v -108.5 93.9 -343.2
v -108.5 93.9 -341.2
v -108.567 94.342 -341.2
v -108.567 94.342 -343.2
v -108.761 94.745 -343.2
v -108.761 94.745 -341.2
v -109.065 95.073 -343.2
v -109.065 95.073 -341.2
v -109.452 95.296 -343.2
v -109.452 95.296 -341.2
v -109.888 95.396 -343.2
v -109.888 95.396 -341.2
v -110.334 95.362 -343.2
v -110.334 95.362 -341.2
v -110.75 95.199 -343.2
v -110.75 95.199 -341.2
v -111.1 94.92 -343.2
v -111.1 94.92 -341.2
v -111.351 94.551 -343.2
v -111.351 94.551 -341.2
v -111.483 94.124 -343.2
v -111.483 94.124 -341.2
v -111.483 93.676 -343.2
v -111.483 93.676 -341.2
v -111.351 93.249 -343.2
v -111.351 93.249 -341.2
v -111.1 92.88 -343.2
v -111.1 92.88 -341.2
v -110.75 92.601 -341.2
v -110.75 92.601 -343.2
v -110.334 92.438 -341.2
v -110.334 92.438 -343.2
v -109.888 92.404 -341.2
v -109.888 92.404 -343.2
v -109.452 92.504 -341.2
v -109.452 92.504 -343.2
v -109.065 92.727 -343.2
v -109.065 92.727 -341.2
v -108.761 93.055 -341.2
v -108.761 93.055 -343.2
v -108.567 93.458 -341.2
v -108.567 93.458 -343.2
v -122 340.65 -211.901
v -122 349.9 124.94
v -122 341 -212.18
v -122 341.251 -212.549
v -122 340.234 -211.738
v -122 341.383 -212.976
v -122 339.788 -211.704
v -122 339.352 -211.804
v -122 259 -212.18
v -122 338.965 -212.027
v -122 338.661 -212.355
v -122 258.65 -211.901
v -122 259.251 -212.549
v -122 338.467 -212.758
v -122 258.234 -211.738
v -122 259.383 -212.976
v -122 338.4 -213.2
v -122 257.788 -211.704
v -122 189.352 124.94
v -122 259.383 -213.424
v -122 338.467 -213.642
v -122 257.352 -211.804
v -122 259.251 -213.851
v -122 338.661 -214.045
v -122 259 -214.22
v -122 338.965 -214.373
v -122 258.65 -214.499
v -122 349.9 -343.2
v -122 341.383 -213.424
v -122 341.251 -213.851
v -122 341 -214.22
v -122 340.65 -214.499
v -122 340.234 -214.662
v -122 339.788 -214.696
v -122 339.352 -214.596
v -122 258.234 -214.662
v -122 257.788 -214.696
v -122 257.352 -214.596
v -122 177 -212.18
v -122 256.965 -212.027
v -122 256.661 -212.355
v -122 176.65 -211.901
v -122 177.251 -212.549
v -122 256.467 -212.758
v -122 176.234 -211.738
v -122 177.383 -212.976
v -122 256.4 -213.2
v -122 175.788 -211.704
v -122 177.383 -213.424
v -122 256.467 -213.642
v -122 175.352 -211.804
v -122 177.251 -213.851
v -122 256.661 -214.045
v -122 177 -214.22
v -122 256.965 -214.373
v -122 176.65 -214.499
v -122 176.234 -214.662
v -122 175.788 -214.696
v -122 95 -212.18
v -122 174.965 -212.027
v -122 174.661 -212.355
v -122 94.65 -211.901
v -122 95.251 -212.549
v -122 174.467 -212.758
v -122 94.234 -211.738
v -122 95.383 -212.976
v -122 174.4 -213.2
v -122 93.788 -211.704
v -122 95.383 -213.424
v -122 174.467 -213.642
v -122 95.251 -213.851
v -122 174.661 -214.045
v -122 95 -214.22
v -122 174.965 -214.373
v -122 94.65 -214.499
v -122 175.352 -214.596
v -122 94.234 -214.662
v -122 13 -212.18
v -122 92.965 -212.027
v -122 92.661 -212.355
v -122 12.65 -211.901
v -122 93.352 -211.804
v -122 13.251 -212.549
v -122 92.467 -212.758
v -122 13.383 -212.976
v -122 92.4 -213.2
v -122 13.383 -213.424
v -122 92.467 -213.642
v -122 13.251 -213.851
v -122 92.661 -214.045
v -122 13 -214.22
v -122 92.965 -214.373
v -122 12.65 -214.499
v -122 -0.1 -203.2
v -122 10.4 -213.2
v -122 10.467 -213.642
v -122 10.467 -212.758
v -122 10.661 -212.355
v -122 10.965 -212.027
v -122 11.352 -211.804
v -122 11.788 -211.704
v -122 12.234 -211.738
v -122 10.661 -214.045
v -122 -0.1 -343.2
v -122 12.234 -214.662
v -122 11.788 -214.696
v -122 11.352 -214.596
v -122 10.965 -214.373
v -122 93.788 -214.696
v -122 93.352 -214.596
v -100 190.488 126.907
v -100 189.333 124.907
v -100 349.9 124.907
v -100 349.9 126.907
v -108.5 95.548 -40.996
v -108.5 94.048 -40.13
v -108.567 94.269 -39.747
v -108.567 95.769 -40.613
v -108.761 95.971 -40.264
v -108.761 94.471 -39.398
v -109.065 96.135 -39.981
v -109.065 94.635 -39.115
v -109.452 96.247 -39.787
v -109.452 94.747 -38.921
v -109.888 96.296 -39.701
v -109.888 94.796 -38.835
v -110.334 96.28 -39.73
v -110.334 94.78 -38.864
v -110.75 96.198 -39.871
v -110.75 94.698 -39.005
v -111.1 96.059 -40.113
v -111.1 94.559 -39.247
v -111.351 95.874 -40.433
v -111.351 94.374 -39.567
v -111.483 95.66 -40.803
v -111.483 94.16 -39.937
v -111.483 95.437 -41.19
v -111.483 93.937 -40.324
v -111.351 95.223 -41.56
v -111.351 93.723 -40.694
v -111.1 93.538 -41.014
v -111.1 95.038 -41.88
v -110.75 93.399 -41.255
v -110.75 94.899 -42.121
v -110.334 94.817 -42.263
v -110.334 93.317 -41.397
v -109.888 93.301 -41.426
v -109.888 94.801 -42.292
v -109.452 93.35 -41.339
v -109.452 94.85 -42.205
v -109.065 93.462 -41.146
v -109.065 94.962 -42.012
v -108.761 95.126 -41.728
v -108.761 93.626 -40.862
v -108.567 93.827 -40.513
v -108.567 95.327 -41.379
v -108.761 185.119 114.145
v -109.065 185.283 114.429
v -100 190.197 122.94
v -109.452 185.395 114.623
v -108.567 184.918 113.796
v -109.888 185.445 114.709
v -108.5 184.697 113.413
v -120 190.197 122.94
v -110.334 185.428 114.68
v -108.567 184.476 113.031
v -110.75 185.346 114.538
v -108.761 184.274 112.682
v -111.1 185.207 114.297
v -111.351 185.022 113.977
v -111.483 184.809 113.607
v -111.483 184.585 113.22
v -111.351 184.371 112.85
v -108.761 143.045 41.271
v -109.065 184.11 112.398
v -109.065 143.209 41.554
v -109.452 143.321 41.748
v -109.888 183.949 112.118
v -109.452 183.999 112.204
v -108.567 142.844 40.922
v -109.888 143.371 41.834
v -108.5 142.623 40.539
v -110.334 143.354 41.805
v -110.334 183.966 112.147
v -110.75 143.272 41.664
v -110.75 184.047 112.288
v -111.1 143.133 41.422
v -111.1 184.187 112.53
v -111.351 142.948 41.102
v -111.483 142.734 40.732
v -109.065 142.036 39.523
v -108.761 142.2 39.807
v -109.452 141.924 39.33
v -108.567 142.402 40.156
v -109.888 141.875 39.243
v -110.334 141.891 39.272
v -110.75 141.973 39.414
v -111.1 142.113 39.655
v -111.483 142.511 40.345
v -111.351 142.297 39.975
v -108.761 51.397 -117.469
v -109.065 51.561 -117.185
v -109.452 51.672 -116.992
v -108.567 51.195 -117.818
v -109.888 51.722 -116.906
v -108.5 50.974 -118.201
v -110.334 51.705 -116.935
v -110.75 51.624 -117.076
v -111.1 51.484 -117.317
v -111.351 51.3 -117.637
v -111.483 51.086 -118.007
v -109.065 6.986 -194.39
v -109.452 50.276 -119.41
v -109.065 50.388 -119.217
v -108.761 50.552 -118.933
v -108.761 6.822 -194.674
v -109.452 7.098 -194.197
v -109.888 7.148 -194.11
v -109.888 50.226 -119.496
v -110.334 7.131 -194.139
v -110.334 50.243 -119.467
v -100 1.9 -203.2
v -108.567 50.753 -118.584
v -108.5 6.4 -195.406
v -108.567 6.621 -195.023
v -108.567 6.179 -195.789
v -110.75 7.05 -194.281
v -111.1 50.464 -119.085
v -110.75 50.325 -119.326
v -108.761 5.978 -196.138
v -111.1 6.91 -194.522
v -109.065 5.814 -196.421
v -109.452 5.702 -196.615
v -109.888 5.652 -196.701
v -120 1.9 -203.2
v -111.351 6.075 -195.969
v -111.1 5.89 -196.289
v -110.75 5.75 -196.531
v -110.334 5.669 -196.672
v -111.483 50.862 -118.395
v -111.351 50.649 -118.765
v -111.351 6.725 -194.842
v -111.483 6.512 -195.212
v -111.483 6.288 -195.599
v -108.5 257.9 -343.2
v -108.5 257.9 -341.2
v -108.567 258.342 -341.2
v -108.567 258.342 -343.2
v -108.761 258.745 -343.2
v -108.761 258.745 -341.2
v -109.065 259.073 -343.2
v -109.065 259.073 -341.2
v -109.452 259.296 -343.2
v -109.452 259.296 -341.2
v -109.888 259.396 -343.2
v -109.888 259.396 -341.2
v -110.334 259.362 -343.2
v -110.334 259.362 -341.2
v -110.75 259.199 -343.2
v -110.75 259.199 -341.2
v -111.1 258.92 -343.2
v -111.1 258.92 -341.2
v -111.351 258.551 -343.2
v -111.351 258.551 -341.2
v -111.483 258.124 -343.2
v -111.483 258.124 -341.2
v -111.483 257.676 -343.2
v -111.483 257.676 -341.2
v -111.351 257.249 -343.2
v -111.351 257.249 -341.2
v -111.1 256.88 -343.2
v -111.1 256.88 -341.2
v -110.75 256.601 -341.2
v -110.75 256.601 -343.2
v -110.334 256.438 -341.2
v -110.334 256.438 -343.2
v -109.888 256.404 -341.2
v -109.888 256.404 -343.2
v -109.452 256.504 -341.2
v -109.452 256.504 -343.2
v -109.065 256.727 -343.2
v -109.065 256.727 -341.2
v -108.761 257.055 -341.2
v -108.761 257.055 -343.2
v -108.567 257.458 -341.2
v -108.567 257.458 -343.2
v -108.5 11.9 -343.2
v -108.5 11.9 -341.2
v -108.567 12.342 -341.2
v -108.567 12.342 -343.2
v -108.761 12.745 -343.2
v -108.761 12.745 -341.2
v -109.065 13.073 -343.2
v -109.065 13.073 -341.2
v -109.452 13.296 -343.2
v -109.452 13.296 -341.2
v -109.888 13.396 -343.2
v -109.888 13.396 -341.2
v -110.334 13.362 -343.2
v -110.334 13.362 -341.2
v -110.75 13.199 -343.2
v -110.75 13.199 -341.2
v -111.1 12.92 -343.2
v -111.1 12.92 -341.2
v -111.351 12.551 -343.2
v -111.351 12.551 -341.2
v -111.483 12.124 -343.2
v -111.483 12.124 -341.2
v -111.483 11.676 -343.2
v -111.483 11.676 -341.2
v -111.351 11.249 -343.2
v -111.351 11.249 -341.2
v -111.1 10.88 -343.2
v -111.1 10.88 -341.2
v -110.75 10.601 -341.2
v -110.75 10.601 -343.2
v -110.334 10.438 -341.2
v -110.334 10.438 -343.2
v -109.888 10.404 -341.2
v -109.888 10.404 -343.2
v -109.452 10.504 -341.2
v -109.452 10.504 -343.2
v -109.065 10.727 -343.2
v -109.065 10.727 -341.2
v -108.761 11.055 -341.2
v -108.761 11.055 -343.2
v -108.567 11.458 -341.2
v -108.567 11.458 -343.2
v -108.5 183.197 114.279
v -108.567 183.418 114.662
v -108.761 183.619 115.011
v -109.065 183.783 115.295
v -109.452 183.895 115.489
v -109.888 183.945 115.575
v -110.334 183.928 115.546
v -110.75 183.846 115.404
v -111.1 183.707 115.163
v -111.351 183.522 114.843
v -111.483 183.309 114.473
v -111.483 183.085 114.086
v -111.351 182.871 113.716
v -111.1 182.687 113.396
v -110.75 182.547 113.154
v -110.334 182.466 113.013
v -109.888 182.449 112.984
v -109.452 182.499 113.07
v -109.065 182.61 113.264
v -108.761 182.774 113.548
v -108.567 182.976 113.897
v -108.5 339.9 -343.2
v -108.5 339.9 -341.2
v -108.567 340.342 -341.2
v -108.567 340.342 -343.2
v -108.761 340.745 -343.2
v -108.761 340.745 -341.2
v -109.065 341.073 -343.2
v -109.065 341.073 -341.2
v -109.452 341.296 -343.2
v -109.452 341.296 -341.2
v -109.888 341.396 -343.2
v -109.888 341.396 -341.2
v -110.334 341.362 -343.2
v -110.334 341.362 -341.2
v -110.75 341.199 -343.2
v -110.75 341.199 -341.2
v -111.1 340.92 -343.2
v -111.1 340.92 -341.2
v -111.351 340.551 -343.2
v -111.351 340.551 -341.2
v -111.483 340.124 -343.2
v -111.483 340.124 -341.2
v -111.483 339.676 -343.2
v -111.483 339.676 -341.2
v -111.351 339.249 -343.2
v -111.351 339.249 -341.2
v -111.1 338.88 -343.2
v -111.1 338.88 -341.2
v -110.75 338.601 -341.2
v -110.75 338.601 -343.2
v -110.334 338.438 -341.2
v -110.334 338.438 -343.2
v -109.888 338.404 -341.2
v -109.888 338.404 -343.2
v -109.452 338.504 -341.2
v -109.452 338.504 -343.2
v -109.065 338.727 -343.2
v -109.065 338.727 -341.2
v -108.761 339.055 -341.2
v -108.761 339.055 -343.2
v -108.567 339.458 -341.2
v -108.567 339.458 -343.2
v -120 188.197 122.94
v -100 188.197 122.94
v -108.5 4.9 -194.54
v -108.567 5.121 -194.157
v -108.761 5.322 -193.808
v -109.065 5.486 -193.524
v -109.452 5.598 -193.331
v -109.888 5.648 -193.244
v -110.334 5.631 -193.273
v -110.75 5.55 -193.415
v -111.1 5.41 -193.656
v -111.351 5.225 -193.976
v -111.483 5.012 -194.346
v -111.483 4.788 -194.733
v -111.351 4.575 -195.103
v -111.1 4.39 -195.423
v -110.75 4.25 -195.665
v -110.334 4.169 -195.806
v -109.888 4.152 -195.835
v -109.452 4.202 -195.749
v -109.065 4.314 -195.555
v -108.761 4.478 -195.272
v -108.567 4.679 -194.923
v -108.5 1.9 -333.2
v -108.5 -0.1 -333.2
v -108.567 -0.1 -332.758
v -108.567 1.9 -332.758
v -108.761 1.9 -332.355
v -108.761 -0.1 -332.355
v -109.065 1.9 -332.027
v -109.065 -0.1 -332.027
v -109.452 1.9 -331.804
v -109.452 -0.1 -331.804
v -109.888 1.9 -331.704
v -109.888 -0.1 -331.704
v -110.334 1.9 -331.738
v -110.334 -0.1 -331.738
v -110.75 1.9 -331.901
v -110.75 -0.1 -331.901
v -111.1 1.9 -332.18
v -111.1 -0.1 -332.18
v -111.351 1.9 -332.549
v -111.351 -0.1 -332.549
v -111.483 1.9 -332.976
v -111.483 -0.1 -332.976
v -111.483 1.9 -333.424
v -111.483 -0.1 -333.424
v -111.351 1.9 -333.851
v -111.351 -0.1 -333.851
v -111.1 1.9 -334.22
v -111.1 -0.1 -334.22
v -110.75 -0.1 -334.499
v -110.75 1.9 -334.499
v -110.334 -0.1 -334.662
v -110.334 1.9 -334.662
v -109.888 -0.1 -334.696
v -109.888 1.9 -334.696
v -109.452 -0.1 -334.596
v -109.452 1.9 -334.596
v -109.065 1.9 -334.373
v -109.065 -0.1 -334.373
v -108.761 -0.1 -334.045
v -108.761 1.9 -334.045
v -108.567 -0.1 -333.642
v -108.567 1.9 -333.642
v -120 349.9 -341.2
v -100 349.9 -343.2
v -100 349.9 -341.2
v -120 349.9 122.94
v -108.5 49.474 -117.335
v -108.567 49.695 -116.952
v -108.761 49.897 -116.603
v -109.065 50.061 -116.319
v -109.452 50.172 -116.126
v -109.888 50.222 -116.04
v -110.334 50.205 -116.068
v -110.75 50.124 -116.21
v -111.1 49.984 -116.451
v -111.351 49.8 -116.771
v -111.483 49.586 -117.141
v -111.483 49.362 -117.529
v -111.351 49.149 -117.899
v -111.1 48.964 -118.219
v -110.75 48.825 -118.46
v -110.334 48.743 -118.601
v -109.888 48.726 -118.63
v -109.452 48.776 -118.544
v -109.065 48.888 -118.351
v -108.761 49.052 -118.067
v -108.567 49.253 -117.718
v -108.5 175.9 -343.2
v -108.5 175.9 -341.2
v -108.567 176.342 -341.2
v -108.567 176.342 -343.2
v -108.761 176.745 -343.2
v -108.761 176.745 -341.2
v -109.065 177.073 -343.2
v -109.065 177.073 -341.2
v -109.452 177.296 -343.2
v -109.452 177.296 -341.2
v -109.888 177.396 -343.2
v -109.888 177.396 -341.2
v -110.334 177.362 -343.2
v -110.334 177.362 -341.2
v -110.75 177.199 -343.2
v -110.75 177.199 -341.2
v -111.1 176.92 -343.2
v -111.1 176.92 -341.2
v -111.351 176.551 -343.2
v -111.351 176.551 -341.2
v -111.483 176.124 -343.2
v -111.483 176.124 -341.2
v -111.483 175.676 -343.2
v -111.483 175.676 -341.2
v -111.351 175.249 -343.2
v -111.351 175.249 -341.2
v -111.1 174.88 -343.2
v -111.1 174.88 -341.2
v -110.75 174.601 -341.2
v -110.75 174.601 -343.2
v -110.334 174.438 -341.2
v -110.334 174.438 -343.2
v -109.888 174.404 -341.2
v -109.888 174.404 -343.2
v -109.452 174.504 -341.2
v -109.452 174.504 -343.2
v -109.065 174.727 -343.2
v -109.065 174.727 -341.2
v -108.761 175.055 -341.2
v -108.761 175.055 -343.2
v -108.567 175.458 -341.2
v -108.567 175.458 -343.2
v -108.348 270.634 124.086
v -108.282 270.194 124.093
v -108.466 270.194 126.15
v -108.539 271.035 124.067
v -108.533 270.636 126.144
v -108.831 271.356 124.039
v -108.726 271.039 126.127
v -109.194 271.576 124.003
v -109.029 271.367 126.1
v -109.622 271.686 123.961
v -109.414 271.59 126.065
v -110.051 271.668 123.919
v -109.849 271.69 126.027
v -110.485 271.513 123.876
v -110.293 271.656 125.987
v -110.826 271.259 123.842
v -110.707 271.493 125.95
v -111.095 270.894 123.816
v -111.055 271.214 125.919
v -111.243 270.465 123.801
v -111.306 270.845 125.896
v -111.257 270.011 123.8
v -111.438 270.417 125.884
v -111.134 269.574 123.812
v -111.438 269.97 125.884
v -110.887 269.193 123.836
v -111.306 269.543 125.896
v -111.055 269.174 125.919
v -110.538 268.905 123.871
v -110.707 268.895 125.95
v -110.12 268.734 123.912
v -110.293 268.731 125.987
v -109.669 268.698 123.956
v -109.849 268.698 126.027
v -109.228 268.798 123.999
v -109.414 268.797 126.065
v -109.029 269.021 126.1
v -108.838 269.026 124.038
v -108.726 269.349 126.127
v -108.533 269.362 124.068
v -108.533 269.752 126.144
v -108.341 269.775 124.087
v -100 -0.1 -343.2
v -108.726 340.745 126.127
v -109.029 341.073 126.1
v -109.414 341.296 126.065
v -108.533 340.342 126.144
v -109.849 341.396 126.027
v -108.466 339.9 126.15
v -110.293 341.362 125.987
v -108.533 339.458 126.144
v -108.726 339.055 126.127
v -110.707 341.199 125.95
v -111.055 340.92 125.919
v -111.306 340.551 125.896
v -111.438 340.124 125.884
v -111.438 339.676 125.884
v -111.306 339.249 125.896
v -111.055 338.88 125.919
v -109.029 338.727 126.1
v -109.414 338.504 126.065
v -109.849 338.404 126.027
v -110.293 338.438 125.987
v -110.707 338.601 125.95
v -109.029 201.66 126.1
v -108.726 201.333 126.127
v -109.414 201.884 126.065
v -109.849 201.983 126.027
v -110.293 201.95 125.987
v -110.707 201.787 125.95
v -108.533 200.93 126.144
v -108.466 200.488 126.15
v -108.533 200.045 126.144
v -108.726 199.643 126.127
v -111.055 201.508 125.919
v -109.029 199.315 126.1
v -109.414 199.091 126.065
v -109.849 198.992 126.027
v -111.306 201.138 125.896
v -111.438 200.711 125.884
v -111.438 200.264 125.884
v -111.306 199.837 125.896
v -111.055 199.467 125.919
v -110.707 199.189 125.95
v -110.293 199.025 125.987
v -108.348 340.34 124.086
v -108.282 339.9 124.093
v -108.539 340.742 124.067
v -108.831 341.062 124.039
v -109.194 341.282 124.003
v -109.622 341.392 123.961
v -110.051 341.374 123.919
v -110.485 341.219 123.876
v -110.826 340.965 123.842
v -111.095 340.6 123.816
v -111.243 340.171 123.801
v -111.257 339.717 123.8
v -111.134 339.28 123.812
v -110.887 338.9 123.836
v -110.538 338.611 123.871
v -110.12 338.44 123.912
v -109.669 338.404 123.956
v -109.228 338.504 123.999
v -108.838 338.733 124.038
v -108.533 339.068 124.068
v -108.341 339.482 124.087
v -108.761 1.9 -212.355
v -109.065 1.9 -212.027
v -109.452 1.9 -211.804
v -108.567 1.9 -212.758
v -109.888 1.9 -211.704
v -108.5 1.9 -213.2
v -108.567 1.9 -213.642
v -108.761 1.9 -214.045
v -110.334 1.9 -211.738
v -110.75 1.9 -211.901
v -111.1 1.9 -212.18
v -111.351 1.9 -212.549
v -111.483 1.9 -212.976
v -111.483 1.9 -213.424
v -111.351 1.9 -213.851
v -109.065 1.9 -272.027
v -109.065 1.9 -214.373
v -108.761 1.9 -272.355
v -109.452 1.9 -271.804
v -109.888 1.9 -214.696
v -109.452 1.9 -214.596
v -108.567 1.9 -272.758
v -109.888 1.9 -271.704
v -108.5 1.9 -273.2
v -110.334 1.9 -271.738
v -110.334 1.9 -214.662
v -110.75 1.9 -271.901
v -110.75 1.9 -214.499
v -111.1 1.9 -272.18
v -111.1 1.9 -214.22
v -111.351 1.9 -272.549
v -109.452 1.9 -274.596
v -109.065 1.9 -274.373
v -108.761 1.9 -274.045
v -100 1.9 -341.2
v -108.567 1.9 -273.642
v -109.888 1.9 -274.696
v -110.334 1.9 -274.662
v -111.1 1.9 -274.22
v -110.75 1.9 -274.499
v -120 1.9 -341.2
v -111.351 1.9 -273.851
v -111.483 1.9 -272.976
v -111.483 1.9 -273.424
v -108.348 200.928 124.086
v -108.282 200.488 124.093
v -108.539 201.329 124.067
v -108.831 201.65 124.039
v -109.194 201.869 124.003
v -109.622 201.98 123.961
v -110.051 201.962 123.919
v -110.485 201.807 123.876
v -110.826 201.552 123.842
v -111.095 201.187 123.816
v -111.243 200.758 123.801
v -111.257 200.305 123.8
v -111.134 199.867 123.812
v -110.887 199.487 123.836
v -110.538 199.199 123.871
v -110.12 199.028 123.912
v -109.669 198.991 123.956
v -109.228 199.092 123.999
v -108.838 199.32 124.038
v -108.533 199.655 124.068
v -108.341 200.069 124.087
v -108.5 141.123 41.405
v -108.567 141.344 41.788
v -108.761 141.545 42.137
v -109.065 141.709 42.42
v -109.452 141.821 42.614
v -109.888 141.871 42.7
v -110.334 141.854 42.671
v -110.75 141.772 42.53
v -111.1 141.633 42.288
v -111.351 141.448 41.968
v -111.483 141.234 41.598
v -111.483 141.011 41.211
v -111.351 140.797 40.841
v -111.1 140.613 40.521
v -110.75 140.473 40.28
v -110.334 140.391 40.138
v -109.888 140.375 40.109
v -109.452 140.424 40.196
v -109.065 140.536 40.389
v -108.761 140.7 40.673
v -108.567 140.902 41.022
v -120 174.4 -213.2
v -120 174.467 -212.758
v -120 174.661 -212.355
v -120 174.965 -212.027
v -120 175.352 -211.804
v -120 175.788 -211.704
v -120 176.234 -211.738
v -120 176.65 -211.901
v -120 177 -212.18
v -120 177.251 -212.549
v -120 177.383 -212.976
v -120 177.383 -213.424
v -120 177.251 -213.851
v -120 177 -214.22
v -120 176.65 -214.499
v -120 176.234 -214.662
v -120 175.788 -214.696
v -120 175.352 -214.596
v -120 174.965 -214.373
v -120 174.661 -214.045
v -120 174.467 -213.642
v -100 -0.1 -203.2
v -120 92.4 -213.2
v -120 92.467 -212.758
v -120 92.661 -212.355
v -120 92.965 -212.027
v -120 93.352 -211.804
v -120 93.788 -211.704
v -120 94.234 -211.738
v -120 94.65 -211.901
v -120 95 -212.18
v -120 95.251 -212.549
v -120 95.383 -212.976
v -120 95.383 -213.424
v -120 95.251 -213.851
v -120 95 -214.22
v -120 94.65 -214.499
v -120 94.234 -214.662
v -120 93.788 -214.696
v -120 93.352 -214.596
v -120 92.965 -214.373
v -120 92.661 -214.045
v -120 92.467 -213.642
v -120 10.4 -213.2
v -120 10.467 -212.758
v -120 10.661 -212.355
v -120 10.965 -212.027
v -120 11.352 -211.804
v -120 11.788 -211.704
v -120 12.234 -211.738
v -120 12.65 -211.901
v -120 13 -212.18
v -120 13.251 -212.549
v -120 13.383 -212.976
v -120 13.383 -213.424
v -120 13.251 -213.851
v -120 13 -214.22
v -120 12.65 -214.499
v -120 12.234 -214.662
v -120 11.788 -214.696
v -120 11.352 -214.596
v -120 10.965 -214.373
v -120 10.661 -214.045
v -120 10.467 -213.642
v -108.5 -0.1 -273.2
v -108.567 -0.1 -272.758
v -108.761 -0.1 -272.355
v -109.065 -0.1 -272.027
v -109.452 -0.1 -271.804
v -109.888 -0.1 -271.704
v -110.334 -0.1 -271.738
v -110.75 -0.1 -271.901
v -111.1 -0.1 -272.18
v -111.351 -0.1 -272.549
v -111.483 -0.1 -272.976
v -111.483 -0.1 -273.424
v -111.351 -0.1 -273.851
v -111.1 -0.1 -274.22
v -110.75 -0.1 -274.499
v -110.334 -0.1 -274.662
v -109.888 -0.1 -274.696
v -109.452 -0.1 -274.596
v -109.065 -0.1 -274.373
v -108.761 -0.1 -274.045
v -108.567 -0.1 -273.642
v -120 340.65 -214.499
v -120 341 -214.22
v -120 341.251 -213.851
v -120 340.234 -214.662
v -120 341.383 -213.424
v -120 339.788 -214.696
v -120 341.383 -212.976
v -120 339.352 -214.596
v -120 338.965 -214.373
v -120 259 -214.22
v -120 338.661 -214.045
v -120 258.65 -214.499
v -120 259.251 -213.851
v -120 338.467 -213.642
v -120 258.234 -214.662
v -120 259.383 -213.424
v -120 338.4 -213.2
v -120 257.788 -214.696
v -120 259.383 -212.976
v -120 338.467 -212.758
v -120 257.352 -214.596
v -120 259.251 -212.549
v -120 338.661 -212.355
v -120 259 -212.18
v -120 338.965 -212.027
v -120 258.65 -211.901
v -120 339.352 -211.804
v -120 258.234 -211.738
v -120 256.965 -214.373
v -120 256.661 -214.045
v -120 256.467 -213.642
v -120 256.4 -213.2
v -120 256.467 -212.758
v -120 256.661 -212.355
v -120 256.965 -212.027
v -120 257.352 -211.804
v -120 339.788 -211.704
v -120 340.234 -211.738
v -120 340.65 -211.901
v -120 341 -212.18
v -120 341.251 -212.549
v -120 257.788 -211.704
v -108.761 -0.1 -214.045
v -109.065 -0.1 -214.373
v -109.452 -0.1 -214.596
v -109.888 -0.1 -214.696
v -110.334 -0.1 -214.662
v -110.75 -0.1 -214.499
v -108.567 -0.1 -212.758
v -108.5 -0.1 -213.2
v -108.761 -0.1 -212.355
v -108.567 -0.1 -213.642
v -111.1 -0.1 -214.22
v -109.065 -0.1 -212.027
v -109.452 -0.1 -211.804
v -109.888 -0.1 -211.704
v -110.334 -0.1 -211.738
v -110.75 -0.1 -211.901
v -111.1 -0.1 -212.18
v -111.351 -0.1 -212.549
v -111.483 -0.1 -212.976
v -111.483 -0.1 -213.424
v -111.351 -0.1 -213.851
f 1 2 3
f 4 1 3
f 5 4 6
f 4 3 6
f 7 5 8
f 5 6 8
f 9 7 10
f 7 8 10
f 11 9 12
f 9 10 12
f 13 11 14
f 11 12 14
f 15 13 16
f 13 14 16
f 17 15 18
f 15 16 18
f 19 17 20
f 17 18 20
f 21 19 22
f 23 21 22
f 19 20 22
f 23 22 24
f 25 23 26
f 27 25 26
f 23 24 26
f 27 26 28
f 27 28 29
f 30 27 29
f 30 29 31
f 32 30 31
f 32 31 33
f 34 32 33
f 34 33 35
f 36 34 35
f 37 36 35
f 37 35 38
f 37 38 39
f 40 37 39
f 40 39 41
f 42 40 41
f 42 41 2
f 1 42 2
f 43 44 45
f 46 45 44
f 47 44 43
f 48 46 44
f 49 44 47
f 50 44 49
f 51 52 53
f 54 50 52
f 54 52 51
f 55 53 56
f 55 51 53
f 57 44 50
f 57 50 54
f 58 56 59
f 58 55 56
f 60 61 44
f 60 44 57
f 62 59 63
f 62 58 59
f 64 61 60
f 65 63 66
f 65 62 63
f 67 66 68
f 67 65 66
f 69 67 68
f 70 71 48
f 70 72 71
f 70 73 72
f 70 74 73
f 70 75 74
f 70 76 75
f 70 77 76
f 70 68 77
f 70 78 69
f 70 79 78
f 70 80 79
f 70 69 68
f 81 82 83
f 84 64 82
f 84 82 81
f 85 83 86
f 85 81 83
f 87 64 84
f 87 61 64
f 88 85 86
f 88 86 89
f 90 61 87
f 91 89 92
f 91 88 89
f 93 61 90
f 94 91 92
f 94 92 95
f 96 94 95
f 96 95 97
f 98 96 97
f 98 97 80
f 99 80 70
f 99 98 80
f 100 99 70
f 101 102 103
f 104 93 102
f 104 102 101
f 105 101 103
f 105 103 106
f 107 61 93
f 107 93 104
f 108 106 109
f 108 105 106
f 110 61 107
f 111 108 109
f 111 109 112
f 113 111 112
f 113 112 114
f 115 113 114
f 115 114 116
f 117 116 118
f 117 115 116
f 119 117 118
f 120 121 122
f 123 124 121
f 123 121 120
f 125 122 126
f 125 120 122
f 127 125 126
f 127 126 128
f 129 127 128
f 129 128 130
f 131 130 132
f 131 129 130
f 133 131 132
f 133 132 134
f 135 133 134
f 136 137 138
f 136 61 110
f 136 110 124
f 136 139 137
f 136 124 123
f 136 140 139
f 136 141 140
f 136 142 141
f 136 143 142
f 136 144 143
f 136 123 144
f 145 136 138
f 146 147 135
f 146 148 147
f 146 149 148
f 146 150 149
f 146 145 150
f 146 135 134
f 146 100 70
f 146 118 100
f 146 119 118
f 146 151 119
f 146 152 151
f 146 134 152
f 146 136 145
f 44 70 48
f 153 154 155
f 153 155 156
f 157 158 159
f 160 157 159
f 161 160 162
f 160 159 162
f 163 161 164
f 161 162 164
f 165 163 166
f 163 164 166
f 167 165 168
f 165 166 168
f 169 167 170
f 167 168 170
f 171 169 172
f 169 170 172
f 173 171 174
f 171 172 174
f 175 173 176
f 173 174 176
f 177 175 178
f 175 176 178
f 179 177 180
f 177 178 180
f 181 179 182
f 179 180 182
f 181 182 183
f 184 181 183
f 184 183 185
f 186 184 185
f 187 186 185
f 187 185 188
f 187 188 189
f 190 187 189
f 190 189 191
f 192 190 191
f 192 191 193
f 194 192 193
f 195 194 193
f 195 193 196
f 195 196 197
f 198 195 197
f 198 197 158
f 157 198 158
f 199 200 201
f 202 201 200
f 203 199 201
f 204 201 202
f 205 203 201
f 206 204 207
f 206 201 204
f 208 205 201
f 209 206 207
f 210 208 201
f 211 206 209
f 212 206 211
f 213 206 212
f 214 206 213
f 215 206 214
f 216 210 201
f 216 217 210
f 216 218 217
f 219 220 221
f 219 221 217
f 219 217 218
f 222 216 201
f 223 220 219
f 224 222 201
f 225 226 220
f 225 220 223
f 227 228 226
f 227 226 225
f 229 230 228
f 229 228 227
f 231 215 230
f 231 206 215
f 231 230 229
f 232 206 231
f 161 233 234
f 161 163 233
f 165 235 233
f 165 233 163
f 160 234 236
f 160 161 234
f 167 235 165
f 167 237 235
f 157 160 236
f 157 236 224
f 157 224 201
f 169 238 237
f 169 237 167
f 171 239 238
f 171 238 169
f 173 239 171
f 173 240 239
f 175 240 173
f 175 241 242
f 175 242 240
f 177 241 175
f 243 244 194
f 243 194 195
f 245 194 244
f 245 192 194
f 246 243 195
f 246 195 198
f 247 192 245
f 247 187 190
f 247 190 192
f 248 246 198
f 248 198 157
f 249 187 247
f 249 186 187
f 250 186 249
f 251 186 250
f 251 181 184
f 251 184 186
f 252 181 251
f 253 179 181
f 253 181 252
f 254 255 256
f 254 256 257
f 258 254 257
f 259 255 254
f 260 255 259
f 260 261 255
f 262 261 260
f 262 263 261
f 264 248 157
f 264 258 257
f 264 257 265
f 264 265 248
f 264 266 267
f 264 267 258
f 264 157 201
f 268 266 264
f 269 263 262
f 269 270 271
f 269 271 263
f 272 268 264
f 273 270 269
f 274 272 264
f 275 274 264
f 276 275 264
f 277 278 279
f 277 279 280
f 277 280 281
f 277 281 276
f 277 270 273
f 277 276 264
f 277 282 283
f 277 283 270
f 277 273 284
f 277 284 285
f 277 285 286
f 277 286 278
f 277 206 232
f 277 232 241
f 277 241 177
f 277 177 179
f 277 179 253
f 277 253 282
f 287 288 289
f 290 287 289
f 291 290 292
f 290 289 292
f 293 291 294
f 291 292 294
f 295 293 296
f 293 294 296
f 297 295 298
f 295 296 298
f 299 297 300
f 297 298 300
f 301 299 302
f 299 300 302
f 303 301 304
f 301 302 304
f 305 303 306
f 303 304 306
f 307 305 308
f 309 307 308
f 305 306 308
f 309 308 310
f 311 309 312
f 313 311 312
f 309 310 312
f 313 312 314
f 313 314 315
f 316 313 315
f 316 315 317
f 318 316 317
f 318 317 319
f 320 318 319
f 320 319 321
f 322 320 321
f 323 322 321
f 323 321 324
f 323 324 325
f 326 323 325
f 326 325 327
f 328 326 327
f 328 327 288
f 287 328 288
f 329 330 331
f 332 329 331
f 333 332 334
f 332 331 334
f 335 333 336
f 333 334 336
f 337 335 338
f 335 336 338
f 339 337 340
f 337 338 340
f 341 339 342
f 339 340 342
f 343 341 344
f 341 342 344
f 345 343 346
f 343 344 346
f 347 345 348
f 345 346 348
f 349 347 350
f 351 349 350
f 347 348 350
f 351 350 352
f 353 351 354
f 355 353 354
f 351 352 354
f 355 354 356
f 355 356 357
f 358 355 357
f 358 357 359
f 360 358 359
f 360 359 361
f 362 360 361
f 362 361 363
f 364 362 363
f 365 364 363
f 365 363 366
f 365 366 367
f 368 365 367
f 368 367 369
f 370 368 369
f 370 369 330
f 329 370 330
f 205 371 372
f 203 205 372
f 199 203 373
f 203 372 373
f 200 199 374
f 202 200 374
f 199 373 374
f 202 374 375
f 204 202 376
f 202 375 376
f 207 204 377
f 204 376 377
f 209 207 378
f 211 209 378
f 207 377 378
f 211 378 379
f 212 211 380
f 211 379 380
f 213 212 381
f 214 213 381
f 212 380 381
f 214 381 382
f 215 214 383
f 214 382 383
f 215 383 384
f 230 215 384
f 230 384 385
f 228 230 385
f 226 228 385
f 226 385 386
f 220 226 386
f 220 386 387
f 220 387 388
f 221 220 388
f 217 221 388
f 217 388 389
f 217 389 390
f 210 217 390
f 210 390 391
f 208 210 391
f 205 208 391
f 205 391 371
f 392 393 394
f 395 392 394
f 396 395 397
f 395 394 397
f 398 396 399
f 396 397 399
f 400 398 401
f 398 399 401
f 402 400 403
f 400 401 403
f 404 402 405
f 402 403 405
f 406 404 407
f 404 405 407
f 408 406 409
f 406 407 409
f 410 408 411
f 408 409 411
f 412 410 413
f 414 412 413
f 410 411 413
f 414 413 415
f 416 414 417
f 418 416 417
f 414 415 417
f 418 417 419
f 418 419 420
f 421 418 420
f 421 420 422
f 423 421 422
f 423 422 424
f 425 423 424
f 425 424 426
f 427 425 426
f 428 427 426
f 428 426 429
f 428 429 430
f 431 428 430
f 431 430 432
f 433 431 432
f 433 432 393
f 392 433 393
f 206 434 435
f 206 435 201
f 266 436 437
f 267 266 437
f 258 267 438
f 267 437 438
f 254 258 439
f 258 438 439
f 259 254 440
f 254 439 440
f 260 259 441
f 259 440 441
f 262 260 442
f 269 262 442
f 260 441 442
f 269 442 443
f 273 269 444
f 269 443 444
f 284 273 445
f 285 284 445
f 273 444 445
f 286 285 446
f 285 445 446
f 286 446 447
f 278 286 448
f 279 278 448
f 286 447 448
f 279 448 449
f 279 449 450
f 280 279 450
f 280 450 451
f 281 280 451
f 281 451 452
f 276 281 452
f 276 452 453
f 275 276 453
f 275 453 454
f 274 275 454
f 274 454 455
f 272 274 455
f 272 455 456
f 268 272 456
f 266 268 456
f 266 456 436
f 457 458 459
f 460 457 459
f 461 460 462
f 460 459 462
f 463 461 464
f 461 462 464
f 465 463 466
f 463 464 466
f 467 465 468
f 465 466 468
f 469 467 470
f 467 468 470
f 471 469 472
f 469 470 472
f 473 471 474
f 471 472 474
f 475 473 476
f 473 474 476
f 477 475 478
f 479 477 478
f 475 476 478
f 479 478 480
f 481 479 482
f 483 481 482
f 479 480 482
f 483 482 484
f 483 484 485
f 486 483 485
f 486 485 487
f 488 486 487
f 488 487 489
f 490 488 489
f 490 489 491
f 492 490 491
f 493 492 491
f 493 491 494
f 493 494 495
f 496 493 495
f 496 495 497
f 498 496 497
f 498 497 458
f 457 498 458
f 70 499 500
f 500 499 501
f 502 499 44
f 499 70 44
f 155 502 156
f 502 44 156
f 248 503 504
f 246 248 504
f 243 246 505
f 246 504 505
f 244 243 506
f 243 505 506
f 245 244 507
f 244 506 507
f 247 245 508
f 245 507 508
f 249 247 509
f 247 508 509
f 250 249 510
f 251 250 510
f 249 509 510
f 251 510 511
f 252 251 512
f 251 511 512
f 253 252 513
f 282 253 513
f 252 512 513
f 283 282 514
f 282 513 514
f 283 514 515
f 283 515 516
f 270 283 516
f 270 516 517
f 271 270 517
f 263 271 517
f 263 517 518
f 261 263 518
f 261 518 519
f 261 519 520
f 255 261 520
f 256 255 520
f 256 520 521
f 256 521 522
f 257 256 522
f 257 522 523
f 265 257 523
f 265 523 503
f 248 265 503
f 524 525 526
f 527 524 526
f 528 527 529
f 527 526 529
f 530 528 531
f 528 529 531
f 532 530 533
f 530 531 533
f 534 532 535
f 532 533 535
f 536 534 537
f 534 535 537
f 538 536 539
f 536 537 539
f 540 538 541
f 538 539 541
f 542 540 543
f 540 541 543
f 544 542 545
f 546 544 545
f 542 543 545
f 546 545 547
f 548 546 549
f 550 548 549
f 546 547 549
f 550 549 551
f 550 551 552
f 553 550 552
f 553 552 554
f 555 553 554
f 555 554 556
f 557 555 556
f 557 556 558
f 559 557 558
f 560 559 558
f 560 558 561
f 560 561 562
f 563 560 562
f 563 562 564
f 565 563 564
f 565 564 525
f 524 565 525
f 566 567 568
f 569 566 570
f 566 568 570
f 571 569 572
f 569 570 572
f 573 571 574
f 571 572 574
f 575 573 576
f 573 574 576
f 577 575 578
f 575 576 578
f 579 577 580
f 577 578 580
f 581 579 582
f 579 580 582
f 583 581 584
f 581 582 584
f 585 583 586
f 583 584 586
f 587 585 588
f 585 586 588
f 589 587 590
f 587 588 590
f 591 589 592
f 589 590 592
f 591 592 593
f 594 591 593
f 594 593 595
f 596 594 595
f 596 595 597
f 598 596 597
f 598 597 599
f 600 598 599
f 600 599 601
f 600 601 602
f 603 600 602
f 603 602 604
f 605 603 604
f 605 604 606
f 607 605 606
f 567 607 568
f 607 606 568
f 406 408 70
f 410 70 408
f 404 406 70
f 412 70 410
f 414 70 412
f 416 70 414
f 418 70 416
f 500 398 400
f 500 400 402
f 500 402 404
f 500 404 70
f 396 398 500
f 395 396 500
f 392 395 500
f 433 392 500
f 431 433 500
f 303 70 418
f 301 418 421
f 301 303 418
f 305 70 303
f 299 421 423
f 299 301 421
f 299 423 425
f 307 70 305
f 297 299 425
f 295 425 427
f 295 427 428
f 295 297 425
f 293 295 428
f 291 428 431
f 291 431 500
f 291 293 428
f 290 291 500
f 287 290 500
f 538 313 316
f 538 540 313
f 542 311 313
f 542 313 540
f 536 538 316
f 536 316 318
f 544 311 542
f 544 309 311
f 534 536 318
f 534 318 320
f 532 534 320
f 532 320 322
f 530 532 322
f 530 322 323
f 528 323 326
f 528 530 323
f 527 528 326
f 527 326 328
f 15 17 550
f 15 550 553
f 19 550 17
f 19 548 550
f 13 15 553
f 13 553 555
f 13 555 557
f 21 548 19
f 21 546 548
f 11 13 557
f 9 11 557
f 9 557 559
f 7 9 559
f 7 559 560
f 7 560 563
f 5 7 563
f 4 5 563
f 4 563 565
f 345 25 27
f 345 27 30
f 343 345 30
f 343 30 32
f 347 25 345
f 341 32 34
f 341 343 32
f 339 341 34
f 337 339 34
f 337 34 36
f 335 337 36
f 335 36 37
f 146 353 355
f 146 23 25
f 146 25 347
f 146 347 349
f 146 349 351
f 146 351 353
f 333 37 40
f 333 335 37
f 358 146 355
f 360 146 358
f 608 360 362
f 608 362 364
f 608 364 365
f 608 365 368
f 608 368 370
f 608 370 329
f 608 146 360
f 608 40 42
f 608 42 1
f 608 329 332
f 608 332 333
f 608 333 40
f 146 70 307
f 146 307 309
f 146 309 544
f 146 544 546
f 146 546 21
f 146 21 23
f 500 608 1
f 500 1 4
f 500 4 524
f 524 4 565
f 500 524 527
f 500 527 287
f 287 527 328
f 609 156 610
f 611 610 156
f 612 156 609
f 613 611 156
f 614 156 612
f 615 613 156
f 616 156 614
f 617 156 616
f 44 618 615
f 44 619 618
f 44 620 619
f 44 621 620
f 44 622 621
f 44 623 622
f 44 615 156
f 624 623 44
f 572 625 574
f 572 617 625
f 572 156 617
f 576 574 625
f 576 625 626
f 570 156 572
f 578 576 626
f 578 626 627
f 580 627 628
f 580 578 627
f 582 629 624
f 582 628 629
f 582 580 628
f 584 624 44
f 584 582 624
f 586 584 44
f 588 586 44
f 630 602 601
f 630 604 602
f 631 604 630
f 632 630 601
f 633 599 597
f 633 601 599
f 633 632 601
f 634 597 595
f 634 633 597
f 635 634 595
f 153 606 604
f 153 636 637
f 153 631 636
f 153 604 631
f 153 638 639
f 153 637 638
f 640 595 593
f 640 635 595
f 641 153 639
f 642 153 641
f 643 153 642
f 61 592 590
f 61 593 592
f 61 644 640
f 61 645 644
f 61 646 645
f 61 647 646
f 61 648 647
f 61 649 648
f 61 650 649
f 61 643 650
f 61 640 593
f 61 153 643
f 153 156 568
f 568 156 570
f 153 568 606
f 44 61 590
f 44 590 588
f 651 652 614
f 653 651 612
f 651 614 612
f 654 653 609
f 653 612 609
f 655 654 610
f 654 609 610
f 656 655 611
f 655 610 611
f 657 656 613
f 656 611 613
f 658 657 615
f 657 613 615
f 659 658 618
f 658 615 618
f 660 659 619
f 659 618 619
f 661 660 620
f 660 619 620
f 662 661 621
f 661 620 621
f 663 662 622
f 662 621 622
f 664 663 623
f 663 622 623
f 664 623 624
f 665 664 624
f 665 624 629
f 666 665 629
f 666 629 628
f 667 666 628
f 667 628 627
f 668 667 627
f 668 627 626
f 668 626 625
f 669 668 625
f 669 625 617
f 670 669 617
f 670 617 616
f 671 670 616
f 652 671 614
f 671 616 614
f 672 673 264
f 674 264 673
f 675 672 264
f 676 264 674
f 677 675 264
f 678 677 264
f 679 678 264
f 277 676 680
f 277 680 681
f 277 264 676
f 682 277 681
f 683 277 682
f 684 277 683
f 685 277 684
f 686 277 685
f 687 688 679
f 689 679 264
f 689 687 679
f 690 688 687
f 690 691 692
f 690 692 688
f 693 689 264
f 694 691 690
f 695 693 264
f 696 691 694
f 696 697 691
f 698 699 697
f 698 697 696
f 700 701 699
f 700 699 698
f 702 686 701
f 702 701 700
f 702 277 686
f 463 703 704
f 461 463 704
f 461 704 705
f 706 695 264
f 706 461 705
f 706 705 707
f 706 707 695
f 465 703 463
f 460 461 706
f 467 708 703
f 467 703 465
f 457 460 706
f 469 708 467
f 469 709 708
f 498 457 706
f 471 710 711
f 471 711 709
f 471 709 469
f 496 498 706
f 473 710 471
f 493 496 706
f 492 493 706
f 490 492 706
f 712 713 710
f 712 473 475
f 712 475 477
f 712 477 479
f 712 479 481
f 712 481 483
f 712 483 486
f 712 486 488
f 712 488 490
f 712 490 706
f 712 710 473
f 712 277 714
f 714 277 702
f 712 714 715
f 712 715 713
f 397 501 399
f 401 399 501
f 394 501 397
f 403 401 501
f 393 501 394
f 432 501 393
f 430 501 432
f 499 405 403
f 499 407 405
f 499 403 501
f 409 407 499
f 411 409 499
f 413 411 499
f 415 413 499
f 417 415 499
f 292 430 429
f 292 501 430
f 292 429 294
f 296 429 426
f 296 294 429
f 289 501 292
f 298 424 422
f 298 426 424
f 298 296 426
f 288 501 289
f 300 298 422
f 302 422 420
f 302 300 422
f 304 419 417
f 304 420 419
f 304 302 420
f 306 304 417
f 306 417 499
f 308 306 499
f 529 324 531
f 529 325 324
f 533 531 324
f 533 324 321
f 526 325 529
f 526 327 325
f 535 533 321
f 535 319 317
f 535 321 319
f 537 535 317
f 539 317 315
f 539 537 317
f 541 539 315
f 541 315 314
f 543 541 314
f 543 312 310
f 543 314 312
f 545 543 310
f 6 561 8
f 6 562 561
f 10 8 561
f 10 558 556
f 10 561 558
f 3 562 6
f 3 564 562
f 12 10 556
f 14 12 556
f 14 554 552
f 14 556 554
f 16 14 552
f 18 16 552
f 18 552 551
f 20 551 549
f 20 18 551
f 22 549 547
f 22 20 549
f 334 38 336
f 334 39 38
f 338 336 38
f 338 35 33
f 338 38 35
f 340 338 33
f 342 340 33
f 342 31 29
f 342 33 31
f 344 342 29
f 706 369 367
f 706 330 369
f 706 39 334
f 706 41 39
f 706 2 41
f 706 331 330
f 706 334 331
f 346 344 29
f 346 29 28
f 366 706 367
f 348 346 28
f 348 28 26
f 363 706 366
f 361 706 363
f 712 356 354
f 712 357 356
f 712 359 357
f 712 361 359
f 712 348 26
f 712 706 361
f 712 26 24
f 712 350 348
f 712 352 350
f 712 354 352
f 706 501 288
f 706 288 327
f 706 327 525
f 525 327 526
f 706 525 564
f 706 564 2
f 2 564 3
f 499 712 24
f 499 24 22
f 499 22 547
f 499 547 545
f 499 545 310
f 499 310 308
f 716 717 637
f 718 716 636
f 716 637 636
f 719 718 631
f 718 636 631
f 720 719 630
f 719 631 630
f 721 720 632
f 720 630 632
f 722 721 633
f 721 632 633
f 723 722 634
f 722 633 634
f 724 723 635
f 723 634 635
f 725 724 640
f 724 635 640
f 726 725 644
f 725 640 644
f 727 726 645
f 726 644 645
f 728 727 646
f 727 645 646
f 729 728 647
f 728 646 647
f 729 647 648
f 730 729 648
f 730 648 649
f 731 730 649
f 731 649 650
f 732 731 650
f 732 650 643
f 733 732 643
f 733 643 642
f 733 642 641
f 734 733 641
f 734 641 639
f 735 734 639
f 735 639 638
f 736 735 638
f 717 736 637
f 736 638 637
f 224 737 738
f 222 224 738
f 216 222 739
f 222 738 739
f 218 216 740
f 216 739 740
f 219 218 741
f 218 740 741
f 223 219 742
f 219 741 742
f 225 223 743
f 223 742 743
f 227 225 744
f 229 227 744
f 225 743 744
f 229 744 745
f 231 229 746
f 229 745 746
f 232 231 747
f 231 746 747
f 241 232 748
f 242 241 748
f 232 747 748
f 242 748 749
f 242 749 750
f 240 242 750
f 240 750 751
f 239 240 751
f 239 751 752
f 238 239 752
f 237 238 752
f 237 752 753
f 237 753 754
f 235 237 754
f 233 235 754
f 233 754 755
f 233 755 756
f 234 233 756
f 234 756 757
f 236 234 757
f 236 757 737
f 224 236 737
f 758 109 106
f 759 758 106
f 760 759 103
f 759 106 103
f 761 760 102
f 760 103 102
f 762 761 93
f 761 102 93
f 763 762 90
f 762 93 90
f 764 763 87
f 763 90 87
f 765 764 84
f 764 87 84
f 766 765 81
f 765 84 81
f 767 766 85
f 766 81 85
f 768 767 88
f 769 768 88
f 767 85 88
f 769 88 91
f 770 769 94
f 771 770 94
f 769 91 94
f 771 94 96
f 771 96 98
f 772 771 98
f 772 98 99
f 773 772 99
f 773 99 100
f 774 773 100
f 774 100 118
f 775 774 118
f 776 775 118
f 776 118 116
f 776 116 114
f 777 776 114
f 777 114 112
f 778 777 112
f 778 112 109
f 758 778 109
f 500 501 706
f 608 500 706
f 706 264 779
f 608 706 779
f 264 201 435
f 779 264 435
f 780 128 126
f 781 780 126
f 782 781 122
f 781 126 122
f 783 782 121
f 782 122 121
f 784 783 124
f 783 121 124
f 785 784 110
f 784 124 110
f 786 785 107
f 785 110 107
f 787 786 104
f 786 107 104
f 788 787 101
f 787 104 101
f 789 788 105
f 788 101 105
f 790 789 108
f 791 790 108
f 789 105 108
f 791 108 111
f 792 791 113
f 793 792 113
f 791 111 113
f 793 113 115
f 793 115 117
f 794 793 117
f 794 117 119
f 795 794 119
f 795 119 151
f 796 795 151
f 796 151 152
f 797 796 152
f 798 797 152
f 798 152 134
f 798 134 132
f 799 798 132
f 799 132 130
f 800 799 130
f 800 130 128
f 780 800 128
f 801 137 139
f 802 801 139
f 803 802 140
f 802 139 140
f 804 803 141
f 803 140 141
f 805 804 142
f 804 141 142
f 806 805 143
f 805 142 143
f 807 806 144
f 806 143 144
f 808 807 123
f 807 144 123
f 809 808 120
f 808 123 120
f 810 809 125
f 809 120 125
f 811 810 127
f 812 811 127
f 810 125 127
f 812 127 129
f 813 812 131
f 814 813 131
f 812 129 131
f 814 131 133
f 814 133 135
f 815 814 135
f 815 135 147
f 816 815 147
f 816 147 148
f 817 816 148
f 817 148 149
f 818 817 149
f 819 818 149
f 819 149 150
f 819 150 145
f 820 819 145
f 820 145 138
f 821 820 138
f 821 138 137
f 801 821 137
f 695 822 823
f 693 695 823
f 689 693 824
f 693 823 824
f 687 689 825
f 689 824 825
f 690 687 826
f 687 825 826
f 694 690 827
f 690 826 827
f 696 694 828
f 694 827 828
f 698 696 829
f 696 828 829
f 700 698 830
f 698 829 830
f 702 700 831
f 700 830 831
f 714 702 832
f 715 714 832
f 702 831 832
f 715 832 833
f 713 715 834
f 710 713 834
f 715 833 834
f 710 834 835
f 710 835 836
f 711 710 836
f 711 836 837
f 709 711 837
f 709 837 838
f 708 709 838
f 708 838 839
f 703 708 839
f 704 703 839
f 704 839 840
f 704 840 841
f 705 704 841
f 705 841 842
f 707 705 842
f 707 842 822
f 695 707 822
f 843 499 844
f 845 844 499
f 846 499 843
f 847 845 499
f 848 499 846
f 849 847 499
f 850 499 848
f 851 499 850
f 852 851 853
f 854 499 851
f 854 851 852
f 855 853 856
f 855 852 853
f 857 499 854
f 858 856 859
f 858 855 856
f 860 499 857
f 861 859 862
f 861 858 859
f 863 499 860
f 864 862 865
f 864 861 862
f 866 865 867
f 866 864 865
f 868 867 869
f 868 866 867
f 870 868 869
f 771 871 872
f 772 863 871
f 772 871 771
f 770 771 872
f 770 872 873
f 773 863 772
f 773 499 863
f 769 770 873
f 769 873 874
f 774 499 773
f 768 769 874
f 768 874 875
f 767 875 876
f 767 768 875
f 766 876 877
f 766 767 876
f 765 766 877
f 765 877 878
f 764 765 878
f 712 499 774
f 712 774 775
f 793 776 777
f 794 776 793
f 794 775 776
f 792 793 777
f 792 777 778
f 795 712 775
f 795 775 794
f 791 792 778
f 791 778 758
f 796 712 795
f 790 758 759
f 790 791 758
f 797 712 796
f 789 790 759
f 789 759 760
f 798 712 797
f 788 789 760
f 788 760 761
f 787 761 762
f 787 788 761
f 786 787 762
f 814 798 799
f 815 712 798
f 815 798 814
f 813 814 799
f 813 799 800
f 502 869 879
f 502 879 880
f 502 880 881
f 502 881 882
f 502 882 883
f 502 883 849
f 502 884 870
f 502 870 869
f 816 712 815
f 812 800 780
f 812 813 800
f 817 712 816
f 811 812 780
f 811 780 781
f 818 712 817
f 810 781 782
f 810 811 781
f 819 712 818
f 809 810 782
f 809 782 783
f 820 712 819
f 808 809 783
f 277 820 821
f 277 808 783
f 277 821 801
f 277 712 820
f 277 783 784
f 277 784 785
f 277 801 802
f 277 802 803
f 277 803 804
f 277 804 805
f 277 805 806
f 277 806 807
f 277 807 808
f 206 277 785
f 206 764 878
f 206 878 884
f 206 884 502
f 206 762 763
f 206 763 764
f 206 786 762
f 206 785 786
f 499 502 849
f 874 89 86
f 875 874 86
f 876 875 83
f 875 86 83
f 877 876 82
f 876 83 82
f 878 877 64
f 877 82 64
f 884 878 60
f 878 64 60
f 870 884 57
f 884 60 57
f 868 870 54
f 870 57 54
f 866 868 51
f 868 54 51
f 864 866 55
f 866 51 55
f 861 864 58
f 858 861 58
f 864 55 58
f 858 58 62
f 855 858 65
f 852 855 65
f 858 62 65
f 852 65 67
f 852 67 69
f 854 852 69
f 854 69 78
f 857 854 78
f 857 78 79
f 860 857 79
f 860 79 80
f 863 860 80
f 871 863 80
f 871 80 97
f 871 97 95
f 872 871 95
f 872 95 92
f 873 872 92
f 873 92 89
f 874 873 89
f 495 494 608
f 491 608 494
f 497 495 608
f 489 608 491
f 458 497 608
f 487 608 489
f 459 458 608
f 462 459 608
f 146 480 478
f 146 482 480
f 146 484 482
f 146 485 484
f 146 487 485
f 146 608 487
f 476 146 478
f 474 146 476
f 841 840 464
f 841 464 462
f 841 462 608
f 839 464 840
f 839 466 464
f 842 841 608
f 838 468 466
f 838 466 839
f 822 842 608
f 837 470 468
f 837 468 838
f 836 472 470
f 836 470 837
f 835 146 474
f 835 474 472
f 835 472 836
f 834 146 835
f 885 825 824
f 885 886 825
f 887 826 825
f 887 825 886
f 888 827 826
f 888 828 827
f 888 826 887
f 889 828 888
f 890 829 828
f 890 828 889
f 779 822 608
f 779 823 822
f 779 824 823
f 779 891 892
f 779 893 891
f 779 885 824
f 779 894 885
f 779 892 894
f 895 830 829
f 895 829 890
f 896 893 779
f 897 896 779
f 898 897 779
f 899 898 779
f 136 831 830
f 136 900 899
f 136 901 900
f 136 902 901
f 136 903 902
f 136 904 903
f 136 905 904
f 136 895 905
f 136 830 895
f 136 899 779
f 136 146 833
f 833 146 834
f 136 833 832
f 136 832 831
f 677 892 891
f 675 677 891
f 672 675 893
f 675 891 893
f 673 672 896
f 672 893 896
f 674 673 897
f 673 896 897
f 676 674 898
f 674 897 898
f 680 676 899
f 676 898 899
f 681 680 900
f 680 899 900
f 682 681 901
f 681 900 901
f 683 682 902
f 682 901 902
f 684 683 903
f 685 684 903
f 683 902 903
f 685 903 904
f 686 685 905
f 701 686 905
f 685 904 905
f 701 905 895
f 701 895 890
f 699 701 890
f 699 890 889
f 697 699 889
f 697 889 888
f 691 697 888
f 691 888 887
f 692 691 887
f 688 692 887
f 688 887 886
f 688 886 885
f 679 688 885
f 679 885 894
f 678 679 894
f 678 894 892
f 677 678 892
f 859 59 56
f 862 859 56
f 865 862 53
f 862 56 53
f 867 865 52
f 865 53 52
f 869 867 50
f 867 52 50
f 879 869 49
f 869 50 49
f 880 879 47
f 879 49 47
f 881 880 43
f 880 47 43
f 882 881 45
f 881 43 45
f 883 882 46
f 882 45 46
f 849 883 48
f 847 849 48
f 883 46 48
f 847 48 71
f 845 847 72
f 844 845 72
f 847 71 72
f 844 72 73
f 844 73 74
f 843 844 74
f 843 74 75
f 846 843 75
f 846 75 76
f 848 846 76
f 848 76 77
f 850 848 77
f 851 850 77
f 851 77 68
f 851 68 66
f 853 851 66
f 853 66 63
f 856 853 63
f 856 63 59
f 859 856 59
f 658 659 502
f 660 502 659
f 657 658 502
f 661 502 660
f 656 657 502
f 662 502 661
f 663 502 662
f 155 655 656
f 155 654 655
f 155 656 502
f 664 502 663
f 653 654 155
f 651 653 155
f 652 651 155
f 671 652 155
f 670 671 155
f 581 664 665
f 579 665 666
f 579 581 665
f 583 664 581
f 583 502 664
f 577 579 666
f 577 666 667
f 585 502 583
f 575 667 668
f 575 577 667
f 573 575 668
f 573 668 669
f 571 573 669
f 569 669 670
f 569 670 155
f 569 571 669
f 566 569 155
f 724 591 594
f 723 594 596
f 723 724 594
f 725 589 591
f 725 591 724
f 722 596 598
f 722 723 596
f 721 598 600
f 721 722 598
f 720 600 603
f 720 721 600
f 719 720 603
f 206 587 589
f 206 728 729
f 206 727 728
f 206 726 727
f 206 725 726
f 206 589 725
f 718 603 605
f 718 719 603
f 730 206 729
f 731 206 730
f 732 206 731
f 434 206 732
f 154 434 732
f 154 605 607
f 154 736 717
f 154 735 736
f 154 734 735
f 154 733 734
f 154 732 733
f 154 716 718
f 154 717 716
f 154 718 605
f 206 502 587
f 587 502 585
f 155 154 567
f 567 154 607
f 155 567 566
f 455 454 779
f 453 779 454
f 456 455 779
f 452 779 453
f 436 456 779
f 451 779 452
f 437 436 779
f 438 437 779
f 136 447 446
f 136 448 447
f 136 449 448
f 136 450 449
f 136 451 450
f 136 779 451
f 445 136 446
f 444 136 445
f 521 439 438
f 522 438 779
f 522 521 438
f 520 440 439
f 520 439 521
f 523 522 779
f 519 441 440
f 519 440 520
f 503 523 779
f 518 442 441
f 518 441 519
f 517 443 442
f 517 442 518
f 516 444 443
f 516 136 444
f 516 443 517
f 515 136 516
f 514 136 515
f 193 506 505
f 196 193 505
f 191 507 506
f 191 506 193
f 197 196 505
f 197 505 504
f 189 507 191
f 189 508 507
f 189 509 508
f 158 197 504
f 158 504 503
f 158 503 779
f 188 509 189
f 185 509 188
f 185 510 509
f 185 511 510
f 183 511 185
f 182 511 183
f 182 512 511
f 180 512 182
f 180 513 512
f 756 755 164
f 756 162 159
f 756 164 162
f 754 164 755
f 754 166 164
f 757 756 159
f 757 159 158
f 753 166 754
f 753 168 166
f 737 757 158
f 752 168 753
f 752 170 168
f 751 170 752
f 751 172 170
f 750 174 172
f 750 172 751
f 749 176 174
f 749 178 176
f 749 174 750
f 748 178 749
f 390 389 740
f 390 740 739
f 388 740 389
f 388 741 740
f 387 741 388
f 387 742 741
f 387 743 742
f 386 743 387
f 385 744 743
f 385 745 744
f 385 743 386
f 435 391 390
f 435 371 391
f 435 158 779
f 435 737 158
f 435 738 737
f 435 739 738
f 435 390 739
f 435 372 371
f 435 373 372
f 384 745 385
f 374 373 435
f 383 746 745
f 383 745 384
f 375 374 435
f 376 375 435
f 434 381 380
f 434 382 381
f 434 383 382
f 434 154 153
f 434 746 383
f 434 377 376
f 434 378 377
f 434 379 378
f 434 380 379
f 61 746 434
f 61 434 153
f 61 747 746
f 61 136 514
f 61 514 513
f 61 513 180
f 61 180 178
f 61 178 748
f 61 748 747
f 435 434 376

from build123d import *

# Parameters (mm, degrees)
PAD015_DEPTH         = 350
POCKET024_DEPTH      = 2.001
POCKET024_DEPTH_BACK = 20.001
PAD016_DEPTH         = 20
SKETCH051_R          = 1.5
POCKET029_DEPTH      = 5
SKETCH052_R          = 1.5
POCKET030_DEPTH      = 5
SKETCH053_R          = 1.5
POCKET031_DEPTH      = 5
SKETCH054_R          = 1.5
POCKET032_DEPTH      = 5
SKETCH055_R          = 1.5
POCKET033_DEPTH      = 5
SKETCH065_R          = 1.5
POCKET041_DEPTH      = 24.001


with BuildPart() as part:
    # Sketch044 (on Face1 of Binder013) → Pad015 (new body)
    with BuildSketch(Plane(origin=(0, -0.1, 0), x_dir=(-1, 0, 0), z_dir=(0, 1, 0))):
        Polygon((100, -343.2), (100, -341.2), (120, -341.2), (120, 122.9396985174), (100, 124.9073888451), (100, 126.9073888451), (122, 124.9396985174), (122, -343.2), align=None)
    extrude(amount=PAD015_DEPTH)

    # Sketch045 (on Face3 of Pad015) → Pocket024 (cut, two sides)
    with BuildSketch(Plane.YZ.offset(-120)) as pocket024_sk:
        Polygon((-0.1, -203.2), (190.4875899006, 126.907389), (-0.1, 126.907389), align=None)
    extrude(amount=-POCKET024_DEPTH, mode=Mode.SUBTRACT)
    extrude(pocket024_sk.sketch, amount=POCKET024_DEPTH_BACK, mode=Mode.SUBTRACT)

    # Sketch046 (on Face7 of Pocket024) → Pad016 (join)
    with BuildSketch(Plane.YZ.offset(-120)):
        Polygon((188.1968427325, 122.9396985174), (190.1968427325, 122.9396985174), (1.9, -203.2), (1.9, -341.2), (-0.1, -341.2), (-0.1, -203.2), align=None)
    extrude(amount=PAD016_DEPTH)

    # Sketch051 (on Face14 of Pad016) → Pocket029 (cut)
    with BuildSketch(Plane(origin=(0, 87.9131810245, -50.7566987298), x_dir=(1, 0, 0), z_dir=(0, -0.8660254038, 0.5))):
        with Locations((-110, 190.567323)):
            Circle(SKETCH051_R)
        with Locations((-110, 106.418902)):
            Circle(SKETCH051_R)
        with Locations((-110, 12.270481)):
            Circle(SKETCH051_R)
        with Locations((-110, -76.877941)):
            Circle(SKETCH051_R)
        with Locations((-110, -166.026362)):
            Circle(SKETCH051_R)
    extrude(amount=-POCKET029_DEPTH, mode=Mode.SUBTRACT)

    # Sketch052 (on Face14 of Pocket029) → Pocket030 (cut)
    with BuildSketch(Plane.XZ.offset(0.1)):
        with Locations((-110, -333.2)):
            Circle(SKETCH052_R)
        with Locations((-110, -273.2)):
            Circle(SKETCH052_R)
        with Locations((-110, -213.2)):
            Circle(SKETCH052_R)
    extrude(amount=-POCKET030_DEPTH, mode=Mode.SUBTRACT)

    # Sketch053 (on Face1 of Pocket030) → Pocket031 (cut)
    with BuildSketch(Plane.XY.offset(-341.2)):
        with Locations((-110, 339.9)):
            Circle(SKETCH053_R)
        with Locations((-110, 175.9)):
            Circle(SKETCH053_R)
        with Locations((-110, 93.9)):
            Circle(SKETCH053_R)
        with Locations((-110, 11.9)):
            Circle(SKETCH053_R)
        with Locations((-110, 257.9)):
            Circle(SKETCH053_R)
    extrude(amount=-POCKET031_DEPTH, mode=Mode.SUBTRACT)

    # Sketch054 (on Face21 of Pocket031) → Pocket032 (cut)
    with BuildSketch(Plane(origin=(-12.0541875412, 0, 134.7733035964), x_dir=(0.9960240399, 0, 0.0890848577), z_dir=(-0.0890848577, 0, 0.9960240399))):
        with Locations((-98.296877, 200.48759)):
            Circle(SKETCH054_R)
        with Locations((-98.296877, 270.193795)):
            Circle(SKETCH054_R)
        with Locations((-98.296877, 339.9)):
            Circle(SKETCH054_R)
    extrude(amount=-POCKET032_DEPTH, mode=Mode.SUBTRACT)

    # Sketch055 (on Face21 of Pocket031) → Pocket033 (cut)
    with BuildSketch(Plane(origin=(-12.0541875412, 0, 134.7733035964), x_dir=(0.9960240399, 0, 0.0890848577), z_dir=(-0.0890848577, 0, 0.9960240399))):
        with Locations((-98.296877, 200.48759)):
            Circle(SKETCH055_R)
        with Locations((-98.296877, 339.9)):
            Circle(SKETCH055_R)
        with Locations((-98.296877, 270.193795)):
            Circle(SKETCH055_R)
    extrude(amount=-POCKET033_DEPTH, mode=Mode.SUBTRACT)

    # Sketch065 (on Face1 of Binder018) → Pocket041 (cut, through all)
    with BuildSketch(Plane(origin=(-124, 0, 0), x_dir=(0, -1, 0), z_dir=(-1, 0, 0))):
        with Locations((-339.9, -213.2)):
            Circle(SKETCH065_R)
        with Locations((-257.9, -213.2)):
            Circle(SKETCH065_R)
        with Locations((-175.9, -213.2)):
            Circle(SKETCH065_R)
        with Locations((-93.9, -213.2)):
            Circle(SKETCH065_R)
        with Locations((-11.9, -213.2)):
            Circle(SKETCH065_R)
    extrude(amount=-POCKET041_DEPTH, mode=Mode.SUBTRACT)


solid = part.part
